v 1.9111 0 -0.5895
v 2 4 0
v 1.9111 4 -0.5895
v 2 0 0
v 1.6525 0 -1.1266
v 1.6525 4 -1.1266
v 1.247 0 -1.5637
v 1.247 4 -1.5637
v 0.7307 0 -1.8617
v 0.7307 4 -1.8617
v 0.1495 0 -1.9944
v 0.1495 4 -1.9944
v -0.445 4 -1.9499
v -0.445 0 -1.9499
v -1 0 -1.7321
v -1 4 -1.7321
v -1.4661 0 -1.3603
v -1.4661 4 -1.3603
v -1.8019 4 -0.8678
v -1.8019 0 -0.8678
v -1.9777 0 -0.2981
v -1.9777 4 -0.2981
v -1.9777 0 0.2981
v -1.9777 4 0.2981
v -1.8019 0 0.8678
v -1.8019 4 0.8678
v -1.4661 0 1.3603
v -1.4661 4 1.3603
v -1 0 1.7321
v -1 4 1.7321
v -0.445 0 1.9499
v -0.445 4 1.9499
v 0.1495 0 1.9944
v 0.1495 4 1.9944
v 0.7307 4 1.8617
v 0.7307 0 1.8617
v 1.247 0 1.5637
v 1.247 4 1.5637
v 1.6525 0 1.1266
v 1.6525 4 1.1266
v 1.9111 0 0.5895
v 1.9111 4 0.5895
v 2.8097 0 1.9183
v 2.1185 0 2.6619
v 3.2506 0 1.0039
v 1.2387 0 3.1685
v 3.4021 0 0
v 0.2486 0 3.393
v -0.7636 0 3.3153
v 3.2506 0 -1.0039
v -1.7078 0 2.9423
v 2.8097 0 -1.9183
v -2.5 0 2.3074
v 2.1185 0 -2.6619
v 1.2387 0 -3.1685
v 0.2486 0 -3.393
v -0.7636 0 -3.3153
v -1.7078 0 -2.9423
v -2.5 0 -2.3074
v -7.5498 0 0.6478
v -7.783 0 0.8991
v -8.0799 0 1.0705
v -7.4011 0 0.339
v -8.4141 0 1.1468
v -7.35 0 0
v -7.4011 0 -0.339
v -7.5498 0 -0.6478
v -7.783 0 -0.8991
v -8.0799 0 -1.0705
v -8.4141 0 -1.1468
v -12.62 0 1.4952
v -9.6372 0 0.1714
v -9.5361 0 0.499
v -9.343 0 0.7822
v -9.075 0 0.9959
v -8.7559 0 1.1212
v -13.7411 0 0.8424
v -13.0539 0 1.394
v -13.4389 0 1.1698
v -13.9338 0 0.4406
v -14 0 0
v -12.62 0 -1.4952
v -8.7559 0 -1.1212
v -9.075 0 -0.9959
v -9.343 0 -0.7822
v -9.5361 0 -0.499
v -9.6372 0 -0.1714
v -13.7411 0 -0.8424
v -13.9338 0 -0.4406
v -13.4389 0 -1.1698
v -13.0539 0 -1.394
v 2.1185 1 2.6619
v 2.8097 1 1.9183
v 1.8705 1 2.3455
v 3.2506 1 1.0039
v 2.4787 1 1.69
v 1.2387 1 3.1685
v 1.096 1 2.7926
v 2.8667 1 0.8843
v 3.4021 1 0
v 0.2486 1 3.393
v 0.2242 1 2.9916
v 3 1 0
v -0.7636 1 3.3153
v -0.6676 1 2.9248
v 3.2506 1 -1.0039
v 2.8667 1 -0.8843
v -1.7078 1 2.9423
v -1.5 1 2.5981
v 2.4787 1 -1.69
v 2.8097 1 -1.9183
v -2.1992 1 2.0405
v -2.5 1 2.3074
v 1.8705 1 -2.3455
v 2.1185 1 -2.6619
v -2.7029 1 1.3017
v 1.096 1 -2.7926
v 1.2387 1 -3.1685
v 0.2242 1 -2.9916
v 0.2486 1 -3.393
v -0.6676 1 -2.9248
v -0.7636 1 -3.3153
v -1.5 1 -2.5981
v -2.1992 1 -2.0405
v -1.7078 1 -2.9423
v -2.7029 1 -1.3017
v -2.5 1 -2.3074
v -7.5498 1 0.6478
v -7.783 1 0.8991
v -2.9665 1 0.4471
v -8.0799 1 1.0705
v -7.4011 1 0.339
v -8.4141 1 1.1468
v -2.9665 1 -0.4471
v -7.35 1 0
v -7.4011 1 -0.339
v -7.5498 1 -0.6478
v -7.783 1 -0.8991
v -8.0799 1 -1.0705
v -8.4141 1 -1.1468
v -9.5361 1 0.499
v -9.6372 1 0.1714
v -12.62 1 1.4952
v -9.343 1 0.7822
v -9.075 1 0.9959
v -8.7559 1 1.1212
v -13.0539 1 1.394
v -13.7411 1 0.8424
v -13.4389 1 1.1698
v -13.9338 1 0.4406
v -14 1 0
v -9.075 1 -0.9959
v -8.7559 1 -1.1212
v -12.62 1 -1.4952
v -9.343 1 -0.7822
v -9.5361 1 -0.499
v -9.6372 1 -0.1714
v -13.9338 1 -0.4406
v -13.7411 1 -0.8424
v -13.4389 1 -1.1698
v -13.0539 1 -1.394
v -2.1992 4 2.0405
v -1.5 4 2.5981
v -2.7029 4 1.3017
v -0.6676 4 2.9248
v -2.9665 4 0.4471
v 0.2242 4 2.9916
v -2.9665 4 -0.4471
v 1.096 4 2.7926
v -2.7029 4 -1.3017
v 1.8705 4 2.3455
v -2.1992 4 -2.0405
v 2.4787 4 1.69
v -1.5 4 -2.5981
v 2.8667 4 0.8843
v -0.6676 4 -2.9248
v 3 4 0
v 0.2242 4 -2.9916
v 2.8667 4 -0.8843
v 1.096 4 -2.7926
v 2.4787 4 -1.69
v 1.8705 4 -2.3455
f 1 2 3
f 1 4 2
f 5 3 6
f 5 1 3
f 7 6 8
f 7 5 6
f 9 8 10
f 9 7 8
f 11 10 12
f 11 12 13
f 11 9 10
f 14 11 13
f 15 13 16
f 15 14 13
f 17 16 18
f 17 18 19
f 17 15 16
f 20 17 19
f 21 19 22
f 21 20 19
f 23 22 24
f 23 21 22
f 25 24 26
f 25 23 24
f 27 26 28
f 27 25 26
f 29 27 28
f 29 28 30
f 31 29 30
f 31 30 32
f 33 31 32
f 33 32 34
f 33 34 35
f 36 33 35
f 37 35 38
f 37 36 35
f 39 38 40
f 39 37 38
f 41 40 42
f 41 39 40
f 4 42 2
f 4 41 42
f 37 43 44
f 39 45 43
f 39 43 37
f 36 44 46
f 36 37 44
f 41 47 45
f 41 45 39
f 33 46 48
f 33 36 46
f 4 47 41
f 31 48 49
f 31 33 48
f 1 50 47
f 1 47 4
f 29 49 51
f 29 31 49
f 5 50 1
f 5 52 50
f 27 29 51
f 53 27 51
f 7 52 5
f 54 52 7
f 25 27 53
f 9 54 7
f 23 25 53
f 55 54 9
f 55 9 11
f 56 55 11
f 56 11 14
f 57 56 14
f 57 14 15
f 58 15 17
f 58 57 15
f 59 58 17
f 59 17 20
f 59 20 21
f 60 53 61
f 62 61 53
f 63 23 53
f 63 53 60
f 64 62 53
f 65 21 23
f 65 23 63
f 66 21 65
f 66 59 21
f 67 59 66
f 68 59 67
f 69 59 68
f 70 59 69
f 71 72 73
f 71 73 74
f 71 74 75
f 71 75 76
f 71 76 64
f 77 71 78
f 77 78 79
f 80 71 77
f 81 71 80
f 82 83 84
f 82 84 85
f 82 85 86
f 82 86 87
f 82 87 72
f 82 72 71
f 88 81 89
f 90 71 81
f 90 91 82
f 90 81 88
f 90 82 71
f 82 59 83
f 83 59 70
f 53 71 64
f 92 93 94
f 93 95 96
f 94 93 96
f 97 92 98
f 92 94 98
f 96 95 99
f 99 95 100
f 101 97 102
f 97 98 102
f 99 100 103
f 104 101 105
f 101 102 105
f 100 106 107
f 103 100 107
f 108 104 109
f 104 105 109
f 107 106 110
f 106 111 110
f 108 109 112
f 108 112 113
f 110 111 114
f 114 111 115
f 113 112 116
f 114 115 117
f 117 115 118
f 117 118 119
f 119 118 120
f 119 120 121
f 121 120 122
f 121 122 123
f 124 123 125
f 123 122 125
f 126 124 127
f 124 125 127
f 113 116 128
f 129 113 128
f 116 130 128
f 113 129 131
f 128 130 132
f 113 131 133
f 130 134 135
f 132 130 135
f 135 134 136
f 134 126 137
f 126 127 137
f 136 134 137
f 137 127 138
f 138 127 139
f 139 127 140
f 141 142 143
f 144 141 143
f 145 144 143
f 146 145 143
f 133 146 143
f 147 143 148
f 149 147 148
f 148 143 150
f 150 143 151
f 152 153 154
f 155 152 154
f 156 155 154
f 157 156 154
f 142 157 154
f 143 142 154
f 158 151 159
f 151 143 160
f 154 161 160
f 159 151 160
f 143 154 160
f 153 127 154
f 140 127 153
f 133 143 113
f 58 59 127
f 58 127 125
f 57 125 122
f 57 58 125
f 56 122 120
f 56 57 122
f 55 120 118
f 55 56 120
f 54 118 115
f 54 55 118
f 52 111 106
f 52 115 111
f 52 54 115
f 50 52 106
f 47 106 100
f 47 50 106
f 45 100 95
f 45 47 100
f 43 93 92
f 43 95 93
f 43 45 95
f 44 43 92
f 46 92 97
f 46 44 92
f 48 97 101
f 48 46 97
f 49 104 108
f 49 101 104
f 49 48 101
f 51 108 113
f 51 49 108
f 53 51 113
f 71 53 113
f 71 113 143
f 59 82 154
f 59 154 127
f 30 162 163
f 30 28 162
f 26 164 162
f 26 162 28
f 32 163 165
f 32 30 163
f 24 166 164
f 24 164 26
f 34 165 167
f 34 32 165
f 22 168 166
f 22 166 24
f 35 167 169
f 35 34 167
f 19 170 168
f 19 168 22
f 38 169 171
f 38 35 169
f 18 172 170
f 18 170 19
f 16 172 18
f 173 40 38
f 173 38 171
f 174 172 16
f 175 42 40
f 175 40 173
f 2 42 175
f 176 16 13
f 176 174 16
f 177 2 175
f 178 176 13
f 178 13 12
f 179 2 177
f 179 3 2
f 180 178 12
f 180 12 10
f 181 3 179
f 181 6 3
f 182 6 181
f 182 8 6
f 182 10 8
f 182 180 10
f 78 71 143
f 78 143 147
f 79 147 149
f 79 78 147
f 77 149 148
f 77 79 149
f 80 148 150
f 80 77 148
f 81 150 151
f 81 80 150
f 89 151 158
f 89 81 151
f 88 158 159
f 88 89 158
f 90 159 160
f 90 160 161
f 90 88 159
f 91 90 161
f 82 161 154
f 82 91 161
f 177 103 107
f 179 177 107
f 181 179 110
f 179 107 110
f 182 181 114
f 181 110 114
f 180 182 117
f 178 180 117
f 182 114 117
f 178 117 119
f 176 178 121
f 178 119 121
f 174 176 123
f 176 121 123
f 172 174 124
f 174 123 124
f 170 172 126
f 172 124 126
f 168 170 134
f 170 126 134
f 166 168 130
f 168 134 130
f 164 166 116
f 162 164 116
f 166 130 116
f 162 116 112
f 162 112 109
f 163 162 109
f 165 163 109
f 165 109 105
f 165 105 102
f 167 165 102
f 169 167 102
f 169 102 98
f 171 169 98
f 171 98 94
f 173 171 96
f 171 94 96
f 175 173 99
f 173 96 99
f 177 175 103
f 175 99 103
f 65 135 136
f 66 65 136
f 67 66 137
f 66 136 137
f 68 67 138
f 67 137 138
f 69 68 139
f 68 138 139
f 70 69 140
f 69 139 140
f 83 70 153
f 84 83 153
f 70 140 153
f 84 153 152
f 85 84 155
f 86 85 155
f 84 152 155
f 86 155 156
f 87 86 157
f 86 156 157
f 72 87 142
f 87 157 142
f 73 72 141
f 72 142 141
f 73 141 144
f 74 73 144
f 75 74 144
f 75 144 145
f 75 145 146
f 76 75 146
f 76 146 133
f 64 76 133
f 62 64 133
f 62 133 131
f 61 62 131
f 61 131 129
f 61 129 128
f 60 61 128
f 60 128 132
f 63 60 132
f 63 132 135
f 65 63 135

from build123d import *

# Parameters (mm, degrees)
SKICA1_R                 = 2
P_IDAT_VYSUNUT_M1_DEPTH  = 1
SKICA2_R                 = 1.15
ODEBRAT_VYSUNUT_M1_DEPTH = 2
SKICA3_R                 = 3
SKICA3_R_2               = 2
P_IDAT_VYSUNUT_M2_DEPTH  = 3
ODEBRAT_VYSUNUT_M2_DEPTH = 10


with BuildPart() as part:
    # Skica1 → Přidat vysunutím1 (new body)
    with BuildSketch(Plane(origin=(0, 0, 0), x_dir=(1, 0, 0), z_dir=(0, 1, 0))):
        with BuildLine():
            Line((-12.62, 1.495192295), (-2.5, 2.307395517))
            Line((-2.5, 2.307395517), (-2.5, 5.25))
            ThreePointArc((-2.5, 5.25), (0, 7.75), (2.5, 5.25))
            Line((2.5, 5.25), (2.5, 2.307395517))
            Line((2.5, 2.307395517), (12.62, 1.495192295))
            ThreePointArc((12.62, 1.495192295), (14, 0), (12.62, -1.495192295))
            Line((12.62, -1.495192295), (2.5, -2.307395517))
            Line((2.5, -2.307395517), (2.5, -5.25))
            ThreePointArc((2.5, -5.25), (0, -7.75), (-2.5, -5.25))
            Line((-2.5, -5.25), (-2.5, -2.307395517))
            Line((-2.5, -2.307395517), (-12.62, -1.495192295))
            ThreePointArc((-12.62, -1.495192295), (-14, 0), (-12.62, 1.495192295))
        make_face()
        Circle(SKICA1_R, mode=Mode.SUBTRACT)
    extrude(amount=P_IDAT_VYSUNUT_M1_DEPTH)

    # Skica2 → Odebrat vysunutím1 (cut)
    with BuildSketch(Plane(origin=(0, 1, 0), x_dir=(1, 0, 0), z_dir=(0, 1, 0))):
        with Locations((-8.5, 0)):
            Circle(SKICA2_R)
        with Locations((8.5, 0)):
            Circle(SKICA2_R)
    extrude(amount=-ODEBRAT_VYSUNUT_M1_DEPTH, mode=Mode.SUBTRACT)

    # Skica3 → Přidat vysunutím2 (add)
    with BuildSketch(Plane(origin=(0, 1, 0), x_dir=(1, 0, 0), z_dir=(0, 1, 0))):
        Circle(SKICA3_R)
        Circle(SKICA3_R_2, mode=Mode.SUBTRACT)
    extrude(amount=P_IDAT_VYSUNUT_M2_DEPTH)

    # Skica4 → Odebrat vysunutím2 (cut)
    with BuildSketch(Plane.XZ):
        with BuildLine():
            Line((-2.5, 2.307395517), (-2.5, 10.588101579))
            Line((-2.5, 10.588101579), (18.005147354, 10.588101579))
            Line((18.005147354, 10.588101579), (18.005147354, -8.717716122))
            Line((18.005147354, -8.717716122), (-2.5, -8.868206906))
            Line((-2.5, -8.868206906), (-2.5, -2.307395517))
            ThreePointArc((-2.5, -2.307395517), (3.402069087, 0), (-2.5, 2.307395517))
        make_face()
    extrude(amount=-ODEBRAT_VYSUNUT_M2_DEPTH, mode=Mode.SUBTRACT)


solid = part.part
